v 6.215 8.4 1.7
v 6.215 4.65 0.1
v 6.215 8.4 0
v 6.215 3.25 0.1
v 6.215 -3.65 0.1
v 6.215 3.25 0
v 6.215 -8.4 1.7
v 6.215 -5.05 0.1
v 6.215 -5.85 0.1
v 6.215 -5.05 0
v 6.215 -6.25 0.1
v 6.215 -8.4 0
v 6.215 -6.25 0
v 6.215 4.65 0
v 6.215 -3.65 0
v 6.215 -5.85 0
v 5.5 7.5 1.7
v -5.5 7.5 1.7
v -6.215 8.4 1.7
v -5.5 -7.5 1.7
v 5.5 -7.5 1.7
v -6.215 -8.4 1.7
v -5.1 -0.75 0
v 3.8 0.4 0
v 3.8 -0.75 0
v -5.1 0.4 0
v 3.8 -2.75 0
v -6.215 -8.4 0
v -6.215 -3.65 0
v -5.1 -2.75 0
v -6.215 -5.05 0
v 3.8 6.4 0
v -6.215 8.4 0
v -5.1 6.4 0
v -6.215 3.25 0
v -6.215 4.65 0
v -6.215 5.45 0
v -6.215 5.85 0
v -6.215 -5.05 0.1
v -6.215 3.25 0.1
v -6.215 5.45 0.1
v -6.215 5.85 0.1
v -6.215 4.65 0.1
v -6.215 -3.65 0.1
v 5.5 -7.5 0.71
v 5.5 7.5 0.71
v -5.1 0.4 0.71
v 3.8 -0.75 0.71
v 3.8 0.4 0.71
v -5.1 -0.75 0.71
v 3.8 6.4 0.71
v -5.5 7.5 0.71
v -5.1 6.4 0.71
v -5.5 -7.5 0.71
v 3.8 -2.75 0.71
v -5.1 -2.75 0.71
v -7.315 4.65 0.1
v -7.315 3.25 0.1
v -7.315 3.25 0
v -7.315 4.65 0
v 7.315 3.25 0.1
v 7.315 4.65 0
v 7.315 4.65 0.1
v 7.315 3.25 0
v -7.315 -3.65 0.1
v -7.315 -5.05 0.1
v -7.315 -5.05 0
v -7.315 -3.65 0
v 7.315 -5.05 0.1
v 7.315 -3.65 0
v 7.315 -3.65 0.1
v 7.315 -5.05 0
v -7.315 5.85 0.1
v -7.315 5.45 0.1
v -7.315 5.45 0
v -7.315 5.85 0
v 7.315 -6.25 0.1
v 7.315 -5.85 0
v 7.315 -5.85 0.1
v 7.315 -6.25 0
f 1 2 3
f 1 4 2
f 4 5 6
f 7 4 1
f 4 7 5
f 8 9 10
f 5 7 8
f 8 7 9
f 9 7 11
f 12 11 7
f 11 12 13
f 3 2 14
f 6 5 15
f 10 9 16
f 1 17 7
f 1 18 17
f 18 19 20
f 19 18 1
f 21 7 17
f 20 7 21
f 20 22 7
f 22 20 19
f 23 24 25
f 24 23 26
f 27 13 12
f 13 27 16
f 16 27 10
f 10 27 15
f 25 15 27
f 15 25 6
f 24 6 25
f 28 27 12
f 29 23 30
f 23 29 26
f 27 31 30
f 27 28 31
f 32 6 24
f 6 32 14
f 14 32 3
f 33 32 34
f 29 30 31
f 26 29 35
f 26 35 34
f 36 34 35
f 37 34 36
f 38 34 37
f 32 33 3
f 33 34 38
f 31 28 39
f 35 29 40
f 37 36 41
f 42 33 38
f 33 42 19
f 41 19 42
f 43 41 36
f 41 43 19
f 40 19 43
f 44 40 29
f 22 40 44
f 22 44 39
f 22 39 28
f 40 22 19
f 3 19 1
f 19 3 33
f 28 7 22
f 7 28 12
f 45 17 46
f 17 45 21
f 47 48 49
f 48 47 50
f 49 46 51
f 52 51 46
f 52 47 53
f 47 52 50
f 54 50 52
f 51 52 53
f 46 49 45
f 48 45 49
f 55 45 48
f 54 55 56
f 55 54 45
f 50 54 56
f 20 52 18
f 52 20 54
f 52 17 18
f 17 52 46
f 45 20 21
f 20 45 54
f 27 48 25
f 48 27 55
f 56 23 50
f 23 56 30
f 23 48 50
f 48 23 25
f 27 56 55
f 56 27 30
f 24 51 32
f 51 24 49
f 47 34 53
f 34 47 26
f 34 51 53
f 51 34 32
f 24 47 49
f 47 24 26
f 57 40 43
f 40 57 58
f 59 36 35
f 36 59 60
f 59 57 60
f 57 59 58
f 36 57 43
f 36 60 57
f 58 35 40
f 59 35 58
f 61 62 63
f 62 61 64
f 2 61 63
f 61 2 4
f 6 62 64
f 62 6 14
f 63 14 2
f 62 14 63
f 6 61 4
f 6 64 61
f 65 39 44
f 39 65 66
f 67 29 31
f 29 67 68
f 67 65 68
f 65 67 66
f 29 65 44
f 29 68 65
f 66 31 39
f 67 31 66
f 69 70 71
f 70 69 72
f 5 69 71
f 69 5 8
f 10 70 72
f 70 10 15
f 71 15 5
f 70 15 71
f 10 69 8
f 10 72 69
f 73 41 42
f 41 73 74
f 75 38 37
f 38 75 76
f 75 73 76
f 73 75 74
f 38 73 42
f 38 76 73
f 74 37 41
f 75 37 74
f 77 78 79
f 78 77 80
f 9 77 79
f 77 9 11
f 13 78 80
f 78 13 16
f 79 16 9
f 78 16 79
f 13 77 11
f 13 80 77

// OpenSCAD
dim=[12.43,16.8,1.7]; // base dimensions
above=0.0; // base above the PCB clearance
color_base=[0.2,0.1,0.1];

dim_pin_small=[1.1,0.4,0.1];
pos_pin_small=[
  [-dim[0]/2-dim_pin_small[0]/2,dim[1]/2-2.75,0.05],
  [ dim[0]/2+dim_pin_small[0]/2,dim[1]/2-14.45,0.05]
];

dim_pin_big=[1.1,1.4,0.1];
pos_pin_big=[
  [-dim[0]/2-dim_pin_big[0]/2,dim[1]/2-4.45,0.05],
  [ dim[0]/2+dim_pin_big[0]/2,dim[1]/2-4.45,0.05],
  [-dim[0]/2-dim_pin_big[0]/2,dim[1]/2-12.75,0.05],
  [ dim[0]/2+dim_pin_big[0]/2,dim[1]/2-12.75,0.05]
];
color_pin="white";

module SCHD3A100()
{
  translate([0,0,dim[2]/2+above])
    difference()
    {
      color(color_base)
        cube(dim, center=true);
      // cut SD card area
      translate([0,0,dim[2]/2-1/2+0.01])
        color(color_base)
          cube([11,15,1],center=true);
      // cut pin soldering area
      translate([-1.3/2,dim[1]/2-10.15,0])
        color(color_base)
          cube([8.9,2,4],center=true);
      // cut pin spring area
      translate([-1.3/2,dim[1]/2-5,0])
        color(color_base)
          cube([8.9,6,4],center=true);
    }
    
    for(i=[0:len(pos_pin_big)-1])
    translate(pos_pin_big[i])
      color(color_pin)
        cube(dim_pin_big,center=true);

    for(i=[0:len(pos_pin_small)-1])
    translate(pos_pin_small[i])
      color(color_pin)
        cube(dim_pin_small,center=true);

}

SCHD3A100();
